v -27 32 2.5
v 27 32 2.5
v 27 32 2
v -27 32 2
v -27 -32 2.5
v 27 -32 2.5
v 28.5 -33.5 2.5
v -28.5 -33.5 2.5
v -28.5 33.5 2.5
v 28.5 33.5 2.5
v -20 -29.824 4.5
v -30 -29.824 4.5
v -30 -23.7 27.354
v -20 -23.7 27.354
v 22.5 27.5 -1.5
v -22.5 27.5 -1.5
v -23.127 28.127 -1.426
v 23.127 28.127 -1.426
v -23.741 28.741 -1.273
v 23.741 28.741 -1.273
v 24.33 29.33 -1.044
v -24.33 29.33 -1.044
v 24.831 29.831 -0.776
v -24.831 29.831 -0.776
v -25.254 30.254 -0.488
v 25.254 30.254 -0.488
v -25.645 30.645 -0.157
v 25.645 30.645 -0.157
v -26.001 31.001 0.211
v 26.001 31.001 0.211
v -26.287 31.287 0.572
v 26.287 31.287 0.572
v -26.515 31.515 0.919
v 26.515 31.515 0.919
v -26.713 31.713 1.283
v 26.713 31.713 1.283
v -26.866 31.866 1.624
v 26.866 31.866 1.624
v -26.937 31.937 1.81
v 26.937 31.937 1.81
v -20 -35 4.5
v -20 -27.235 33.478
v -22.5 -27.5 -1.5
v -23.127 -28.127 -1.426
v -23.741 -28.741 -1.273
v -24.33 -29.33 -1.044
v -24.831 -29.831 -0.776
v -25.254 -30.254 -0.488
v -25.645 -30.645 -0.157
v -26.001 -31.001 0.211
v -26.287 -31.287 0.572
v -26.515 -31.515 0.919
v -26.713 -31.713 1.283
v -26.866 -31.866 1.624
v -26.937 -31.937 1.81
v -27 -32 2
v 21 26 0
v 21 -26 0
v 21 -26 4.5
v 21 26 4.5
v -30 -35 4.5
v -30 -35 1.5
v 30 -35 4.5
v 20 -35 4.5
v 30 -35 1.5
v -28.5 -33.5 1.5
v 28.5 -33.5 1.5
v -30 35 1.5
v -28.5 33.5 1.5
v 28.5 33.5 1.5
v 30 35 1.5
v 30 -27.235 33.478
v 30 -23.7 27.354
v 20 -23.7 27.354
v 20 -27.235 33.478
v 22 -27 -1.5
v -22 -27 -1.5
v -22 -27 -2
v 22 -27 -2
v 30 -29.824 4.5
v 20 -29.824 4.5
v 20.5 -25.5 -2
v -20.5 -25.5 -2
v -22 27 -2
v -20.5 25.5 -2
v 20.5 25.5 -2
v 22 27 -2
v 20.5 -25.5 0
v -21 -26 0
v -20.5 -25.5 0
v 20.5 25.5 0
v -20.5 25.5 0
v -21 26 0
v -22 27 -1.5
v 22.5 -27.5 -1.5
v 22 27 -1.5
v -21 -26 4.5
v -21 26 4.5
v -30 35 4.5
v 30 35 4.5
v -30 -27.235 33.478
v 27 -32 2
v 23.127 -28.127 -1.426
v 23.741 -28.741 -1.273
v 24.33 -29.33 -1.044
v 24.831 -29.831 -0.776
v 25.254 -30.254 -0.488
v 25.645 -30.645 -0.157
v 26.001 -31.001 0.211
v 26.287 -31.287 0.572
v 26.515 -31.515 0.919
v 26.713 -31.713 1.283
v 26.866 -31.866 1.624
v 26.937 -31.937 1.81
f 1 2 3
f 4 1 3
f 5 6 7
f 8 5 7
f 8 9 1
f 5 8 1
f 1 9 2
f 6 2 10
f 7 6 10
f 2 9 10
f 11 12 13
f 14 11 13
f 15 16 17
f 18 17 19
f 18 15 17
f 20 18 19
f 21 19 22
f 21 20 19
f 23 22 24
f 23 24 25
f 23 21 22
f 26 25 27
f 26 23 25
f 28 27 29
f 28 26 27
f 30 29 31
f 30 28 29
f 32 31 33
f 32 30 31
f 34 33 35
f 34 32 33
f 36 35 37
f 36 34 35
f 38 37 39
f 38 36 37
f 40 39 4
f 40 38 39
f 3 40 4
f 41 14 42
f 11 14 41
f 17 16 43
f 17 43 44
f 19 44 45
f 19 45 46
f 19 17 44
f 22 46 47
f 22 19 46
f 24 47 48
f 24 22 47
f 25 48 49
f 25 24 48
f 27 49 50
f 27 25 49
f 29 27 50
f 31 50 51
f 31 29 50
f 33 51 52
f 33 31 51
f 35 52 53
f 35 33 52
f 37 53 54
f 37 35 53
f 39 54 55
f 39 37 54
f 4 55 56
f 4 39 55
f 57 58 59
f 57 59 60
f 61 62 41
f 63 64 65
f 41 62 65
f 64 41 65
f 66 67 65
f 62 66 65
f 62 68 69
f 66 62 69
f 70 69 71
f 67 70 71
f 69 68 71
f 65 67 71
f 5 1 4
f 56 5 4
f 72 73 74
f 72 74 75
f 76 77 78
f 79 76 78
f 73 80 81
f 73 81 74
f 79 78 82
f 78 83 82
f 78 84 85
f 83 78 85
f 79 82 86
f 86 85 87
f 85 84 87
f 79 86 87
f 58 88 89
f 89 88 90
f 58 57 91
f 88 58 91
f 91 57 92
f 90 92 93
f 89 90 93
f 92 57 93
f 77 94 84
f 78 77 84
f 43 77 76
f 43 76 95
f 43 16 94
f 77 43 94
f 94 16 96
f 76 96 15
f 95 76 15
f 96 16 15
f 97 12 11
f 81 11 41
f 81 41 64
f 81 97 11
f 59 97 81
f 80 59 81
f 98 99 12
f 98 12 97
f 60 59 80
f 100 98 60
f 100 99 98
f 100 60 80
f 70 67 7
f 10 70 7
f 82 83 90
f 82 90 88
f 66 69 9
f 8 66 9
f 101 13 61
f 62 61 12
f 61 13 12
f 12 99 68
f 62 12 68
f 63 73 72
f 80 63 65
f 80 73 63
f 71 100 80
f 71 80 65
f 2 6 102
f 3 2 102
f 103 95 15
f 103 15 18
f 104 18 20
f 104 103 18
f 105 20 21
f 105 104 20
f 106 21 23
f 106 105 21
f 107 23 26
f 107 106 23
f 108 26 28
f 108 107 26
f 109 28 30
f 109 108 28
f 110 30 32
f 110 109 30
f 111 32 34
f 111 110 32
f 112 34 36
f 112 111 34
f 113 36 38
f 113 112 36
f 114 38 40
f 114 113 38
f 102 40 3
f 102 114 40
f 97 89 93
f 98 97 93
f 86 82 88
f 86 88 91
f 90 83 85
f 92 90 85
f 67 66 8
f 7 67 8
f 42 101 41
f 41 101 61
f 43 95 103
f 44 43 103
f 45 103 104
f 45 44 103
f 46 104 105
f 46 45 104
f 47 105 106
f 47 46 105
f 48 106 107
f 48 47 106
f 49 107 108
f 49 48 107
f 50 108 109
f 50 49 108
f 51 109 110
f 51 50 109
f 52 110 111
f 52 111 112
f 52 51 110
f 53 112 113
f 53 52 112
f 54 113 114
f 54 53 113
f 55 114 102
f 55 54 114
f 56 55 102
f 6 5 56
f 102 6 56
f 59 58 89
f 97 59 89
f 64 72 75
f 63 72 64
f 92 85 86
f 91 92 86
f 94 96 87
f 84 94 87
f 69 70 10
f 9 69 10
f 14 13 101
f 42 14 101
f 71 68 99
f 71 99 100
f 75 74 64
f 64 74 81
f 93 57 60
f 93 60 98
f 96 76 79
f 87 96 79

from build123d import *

# Parameters (mm, degrees)
EXTRUDE_1_DEPTH      = 4.5
EXTRUDE_1_DEPTH_BACK = 2
SKETCH_1_W           = 60
SKETCH_1_H           = 70
SKETCH_1_W_2         = 41
SKETCH_1_H_2         = 51
SKETCH_2_W           = 42
SKETCH_2_H           = 52
CUT_EXTRUDE_2_DEPTH  = 47.316843588
EXTRUDE_2_DEPTH      = 10


with BuildPart() as part:
    # Эскиз1 → Бобышка-Вытянуть1 (new, two sides: drawn at the far end of the back side and taken through both)
    with BuildSketch(Plane.XY.offset(-EXTRUDE_1_DEPTH_BACK)):
        Rectangle(SKETCH_1_W, SKETCH_1_H)
        Rectangle(SKETCH_1_W_2, SKETCH_1_H_2, mode=Mode.SUBTRACT)
    extrude(amount=EXTRUDE_1_DEPTH + EXTRUDE_1_DEPTH_BACK)

    # Эскиз2 → Вырез-Вытянуть2 (cut, through all)
    with BuildSketch(Plane(origin=(0, 0, 0), x_dir=(-1, 0, 0), z_dir=(0, 0, -1))):
        Rectangle(SKETCH_2_W, SKETCH_2_H)
    extrude(amount=-CUT_EXTRUDE_2_DEPTH, mode=Mode.SUBTRACT)

    # Вырез-По траектории1: sweep along a path in Эскиз4
    with BuildLine(Plane(origin=(0, 0, -2), x_dir=(-1, 0, 0), z_dir=(0, 0, -1))) as sweep_1_path:
        Line((-30, 35), (-30, -35))
        Line((-30, -35), (30, -35))
        Line((30, -35), (30, 35))
        Line((30, 35), (-30, 35))
    # Эскиз3 → Вырез-По траектории1 (sweep, cut)
    with BuildSketch(Plane(origin=(0, -35, 0), x_dir=(-1, 0, 0), z_dir=(0, -1, 0))):
        with BuildLine():
            Line((-30, 2), (-30, -1.5))
            Line((-30, -1.5), (-28.5, -1.5))
            Line((-28.5, -1.5), (-28.5, -2.5))
            Line((-28.5, -2.5), (-27, -2.5))
            Line((-27, -2.5), (-27, -2))
            ThreePointArc((-27, -2), (-25.297684645, 0.454165972), (-22.5, 1.5))
            Line((-22.5, 1.5), (-22, 1.5))
            Line((-22, 1.5), (-22, 2))
            Line((-22, 2), (-30, 2))
        make_face()
    sweep(path=sweep_1_path.line, transition=Transition.RIGHT, mode=Mode.SUBTRACT)

    # Эскиз5 → Бобышка-Вытянуть2 (add)
    with BuildSketch(Plane(origin=(30, 0, 0), x_dir=(0, 0, -1), z_dir=(1, 0, 0))):
        Polygon((-33.477774789, -27.235428647), (-4.5, -35), (-4.5, -29.823619098), (-27.354050432, -23.699894741), align=None)
    extrude_2 = extrude(amount=-EXTRUDE_2_DEPTH)

    # Зеркальное отражение1: Бобышка-Вытянуть2 across plane
    add(extrude_2.mirror(Plane(origin=(0, 0, 0), x_dir=(0, 0, 1), z_dir=(1, 0, 0))))


solid = part.part
